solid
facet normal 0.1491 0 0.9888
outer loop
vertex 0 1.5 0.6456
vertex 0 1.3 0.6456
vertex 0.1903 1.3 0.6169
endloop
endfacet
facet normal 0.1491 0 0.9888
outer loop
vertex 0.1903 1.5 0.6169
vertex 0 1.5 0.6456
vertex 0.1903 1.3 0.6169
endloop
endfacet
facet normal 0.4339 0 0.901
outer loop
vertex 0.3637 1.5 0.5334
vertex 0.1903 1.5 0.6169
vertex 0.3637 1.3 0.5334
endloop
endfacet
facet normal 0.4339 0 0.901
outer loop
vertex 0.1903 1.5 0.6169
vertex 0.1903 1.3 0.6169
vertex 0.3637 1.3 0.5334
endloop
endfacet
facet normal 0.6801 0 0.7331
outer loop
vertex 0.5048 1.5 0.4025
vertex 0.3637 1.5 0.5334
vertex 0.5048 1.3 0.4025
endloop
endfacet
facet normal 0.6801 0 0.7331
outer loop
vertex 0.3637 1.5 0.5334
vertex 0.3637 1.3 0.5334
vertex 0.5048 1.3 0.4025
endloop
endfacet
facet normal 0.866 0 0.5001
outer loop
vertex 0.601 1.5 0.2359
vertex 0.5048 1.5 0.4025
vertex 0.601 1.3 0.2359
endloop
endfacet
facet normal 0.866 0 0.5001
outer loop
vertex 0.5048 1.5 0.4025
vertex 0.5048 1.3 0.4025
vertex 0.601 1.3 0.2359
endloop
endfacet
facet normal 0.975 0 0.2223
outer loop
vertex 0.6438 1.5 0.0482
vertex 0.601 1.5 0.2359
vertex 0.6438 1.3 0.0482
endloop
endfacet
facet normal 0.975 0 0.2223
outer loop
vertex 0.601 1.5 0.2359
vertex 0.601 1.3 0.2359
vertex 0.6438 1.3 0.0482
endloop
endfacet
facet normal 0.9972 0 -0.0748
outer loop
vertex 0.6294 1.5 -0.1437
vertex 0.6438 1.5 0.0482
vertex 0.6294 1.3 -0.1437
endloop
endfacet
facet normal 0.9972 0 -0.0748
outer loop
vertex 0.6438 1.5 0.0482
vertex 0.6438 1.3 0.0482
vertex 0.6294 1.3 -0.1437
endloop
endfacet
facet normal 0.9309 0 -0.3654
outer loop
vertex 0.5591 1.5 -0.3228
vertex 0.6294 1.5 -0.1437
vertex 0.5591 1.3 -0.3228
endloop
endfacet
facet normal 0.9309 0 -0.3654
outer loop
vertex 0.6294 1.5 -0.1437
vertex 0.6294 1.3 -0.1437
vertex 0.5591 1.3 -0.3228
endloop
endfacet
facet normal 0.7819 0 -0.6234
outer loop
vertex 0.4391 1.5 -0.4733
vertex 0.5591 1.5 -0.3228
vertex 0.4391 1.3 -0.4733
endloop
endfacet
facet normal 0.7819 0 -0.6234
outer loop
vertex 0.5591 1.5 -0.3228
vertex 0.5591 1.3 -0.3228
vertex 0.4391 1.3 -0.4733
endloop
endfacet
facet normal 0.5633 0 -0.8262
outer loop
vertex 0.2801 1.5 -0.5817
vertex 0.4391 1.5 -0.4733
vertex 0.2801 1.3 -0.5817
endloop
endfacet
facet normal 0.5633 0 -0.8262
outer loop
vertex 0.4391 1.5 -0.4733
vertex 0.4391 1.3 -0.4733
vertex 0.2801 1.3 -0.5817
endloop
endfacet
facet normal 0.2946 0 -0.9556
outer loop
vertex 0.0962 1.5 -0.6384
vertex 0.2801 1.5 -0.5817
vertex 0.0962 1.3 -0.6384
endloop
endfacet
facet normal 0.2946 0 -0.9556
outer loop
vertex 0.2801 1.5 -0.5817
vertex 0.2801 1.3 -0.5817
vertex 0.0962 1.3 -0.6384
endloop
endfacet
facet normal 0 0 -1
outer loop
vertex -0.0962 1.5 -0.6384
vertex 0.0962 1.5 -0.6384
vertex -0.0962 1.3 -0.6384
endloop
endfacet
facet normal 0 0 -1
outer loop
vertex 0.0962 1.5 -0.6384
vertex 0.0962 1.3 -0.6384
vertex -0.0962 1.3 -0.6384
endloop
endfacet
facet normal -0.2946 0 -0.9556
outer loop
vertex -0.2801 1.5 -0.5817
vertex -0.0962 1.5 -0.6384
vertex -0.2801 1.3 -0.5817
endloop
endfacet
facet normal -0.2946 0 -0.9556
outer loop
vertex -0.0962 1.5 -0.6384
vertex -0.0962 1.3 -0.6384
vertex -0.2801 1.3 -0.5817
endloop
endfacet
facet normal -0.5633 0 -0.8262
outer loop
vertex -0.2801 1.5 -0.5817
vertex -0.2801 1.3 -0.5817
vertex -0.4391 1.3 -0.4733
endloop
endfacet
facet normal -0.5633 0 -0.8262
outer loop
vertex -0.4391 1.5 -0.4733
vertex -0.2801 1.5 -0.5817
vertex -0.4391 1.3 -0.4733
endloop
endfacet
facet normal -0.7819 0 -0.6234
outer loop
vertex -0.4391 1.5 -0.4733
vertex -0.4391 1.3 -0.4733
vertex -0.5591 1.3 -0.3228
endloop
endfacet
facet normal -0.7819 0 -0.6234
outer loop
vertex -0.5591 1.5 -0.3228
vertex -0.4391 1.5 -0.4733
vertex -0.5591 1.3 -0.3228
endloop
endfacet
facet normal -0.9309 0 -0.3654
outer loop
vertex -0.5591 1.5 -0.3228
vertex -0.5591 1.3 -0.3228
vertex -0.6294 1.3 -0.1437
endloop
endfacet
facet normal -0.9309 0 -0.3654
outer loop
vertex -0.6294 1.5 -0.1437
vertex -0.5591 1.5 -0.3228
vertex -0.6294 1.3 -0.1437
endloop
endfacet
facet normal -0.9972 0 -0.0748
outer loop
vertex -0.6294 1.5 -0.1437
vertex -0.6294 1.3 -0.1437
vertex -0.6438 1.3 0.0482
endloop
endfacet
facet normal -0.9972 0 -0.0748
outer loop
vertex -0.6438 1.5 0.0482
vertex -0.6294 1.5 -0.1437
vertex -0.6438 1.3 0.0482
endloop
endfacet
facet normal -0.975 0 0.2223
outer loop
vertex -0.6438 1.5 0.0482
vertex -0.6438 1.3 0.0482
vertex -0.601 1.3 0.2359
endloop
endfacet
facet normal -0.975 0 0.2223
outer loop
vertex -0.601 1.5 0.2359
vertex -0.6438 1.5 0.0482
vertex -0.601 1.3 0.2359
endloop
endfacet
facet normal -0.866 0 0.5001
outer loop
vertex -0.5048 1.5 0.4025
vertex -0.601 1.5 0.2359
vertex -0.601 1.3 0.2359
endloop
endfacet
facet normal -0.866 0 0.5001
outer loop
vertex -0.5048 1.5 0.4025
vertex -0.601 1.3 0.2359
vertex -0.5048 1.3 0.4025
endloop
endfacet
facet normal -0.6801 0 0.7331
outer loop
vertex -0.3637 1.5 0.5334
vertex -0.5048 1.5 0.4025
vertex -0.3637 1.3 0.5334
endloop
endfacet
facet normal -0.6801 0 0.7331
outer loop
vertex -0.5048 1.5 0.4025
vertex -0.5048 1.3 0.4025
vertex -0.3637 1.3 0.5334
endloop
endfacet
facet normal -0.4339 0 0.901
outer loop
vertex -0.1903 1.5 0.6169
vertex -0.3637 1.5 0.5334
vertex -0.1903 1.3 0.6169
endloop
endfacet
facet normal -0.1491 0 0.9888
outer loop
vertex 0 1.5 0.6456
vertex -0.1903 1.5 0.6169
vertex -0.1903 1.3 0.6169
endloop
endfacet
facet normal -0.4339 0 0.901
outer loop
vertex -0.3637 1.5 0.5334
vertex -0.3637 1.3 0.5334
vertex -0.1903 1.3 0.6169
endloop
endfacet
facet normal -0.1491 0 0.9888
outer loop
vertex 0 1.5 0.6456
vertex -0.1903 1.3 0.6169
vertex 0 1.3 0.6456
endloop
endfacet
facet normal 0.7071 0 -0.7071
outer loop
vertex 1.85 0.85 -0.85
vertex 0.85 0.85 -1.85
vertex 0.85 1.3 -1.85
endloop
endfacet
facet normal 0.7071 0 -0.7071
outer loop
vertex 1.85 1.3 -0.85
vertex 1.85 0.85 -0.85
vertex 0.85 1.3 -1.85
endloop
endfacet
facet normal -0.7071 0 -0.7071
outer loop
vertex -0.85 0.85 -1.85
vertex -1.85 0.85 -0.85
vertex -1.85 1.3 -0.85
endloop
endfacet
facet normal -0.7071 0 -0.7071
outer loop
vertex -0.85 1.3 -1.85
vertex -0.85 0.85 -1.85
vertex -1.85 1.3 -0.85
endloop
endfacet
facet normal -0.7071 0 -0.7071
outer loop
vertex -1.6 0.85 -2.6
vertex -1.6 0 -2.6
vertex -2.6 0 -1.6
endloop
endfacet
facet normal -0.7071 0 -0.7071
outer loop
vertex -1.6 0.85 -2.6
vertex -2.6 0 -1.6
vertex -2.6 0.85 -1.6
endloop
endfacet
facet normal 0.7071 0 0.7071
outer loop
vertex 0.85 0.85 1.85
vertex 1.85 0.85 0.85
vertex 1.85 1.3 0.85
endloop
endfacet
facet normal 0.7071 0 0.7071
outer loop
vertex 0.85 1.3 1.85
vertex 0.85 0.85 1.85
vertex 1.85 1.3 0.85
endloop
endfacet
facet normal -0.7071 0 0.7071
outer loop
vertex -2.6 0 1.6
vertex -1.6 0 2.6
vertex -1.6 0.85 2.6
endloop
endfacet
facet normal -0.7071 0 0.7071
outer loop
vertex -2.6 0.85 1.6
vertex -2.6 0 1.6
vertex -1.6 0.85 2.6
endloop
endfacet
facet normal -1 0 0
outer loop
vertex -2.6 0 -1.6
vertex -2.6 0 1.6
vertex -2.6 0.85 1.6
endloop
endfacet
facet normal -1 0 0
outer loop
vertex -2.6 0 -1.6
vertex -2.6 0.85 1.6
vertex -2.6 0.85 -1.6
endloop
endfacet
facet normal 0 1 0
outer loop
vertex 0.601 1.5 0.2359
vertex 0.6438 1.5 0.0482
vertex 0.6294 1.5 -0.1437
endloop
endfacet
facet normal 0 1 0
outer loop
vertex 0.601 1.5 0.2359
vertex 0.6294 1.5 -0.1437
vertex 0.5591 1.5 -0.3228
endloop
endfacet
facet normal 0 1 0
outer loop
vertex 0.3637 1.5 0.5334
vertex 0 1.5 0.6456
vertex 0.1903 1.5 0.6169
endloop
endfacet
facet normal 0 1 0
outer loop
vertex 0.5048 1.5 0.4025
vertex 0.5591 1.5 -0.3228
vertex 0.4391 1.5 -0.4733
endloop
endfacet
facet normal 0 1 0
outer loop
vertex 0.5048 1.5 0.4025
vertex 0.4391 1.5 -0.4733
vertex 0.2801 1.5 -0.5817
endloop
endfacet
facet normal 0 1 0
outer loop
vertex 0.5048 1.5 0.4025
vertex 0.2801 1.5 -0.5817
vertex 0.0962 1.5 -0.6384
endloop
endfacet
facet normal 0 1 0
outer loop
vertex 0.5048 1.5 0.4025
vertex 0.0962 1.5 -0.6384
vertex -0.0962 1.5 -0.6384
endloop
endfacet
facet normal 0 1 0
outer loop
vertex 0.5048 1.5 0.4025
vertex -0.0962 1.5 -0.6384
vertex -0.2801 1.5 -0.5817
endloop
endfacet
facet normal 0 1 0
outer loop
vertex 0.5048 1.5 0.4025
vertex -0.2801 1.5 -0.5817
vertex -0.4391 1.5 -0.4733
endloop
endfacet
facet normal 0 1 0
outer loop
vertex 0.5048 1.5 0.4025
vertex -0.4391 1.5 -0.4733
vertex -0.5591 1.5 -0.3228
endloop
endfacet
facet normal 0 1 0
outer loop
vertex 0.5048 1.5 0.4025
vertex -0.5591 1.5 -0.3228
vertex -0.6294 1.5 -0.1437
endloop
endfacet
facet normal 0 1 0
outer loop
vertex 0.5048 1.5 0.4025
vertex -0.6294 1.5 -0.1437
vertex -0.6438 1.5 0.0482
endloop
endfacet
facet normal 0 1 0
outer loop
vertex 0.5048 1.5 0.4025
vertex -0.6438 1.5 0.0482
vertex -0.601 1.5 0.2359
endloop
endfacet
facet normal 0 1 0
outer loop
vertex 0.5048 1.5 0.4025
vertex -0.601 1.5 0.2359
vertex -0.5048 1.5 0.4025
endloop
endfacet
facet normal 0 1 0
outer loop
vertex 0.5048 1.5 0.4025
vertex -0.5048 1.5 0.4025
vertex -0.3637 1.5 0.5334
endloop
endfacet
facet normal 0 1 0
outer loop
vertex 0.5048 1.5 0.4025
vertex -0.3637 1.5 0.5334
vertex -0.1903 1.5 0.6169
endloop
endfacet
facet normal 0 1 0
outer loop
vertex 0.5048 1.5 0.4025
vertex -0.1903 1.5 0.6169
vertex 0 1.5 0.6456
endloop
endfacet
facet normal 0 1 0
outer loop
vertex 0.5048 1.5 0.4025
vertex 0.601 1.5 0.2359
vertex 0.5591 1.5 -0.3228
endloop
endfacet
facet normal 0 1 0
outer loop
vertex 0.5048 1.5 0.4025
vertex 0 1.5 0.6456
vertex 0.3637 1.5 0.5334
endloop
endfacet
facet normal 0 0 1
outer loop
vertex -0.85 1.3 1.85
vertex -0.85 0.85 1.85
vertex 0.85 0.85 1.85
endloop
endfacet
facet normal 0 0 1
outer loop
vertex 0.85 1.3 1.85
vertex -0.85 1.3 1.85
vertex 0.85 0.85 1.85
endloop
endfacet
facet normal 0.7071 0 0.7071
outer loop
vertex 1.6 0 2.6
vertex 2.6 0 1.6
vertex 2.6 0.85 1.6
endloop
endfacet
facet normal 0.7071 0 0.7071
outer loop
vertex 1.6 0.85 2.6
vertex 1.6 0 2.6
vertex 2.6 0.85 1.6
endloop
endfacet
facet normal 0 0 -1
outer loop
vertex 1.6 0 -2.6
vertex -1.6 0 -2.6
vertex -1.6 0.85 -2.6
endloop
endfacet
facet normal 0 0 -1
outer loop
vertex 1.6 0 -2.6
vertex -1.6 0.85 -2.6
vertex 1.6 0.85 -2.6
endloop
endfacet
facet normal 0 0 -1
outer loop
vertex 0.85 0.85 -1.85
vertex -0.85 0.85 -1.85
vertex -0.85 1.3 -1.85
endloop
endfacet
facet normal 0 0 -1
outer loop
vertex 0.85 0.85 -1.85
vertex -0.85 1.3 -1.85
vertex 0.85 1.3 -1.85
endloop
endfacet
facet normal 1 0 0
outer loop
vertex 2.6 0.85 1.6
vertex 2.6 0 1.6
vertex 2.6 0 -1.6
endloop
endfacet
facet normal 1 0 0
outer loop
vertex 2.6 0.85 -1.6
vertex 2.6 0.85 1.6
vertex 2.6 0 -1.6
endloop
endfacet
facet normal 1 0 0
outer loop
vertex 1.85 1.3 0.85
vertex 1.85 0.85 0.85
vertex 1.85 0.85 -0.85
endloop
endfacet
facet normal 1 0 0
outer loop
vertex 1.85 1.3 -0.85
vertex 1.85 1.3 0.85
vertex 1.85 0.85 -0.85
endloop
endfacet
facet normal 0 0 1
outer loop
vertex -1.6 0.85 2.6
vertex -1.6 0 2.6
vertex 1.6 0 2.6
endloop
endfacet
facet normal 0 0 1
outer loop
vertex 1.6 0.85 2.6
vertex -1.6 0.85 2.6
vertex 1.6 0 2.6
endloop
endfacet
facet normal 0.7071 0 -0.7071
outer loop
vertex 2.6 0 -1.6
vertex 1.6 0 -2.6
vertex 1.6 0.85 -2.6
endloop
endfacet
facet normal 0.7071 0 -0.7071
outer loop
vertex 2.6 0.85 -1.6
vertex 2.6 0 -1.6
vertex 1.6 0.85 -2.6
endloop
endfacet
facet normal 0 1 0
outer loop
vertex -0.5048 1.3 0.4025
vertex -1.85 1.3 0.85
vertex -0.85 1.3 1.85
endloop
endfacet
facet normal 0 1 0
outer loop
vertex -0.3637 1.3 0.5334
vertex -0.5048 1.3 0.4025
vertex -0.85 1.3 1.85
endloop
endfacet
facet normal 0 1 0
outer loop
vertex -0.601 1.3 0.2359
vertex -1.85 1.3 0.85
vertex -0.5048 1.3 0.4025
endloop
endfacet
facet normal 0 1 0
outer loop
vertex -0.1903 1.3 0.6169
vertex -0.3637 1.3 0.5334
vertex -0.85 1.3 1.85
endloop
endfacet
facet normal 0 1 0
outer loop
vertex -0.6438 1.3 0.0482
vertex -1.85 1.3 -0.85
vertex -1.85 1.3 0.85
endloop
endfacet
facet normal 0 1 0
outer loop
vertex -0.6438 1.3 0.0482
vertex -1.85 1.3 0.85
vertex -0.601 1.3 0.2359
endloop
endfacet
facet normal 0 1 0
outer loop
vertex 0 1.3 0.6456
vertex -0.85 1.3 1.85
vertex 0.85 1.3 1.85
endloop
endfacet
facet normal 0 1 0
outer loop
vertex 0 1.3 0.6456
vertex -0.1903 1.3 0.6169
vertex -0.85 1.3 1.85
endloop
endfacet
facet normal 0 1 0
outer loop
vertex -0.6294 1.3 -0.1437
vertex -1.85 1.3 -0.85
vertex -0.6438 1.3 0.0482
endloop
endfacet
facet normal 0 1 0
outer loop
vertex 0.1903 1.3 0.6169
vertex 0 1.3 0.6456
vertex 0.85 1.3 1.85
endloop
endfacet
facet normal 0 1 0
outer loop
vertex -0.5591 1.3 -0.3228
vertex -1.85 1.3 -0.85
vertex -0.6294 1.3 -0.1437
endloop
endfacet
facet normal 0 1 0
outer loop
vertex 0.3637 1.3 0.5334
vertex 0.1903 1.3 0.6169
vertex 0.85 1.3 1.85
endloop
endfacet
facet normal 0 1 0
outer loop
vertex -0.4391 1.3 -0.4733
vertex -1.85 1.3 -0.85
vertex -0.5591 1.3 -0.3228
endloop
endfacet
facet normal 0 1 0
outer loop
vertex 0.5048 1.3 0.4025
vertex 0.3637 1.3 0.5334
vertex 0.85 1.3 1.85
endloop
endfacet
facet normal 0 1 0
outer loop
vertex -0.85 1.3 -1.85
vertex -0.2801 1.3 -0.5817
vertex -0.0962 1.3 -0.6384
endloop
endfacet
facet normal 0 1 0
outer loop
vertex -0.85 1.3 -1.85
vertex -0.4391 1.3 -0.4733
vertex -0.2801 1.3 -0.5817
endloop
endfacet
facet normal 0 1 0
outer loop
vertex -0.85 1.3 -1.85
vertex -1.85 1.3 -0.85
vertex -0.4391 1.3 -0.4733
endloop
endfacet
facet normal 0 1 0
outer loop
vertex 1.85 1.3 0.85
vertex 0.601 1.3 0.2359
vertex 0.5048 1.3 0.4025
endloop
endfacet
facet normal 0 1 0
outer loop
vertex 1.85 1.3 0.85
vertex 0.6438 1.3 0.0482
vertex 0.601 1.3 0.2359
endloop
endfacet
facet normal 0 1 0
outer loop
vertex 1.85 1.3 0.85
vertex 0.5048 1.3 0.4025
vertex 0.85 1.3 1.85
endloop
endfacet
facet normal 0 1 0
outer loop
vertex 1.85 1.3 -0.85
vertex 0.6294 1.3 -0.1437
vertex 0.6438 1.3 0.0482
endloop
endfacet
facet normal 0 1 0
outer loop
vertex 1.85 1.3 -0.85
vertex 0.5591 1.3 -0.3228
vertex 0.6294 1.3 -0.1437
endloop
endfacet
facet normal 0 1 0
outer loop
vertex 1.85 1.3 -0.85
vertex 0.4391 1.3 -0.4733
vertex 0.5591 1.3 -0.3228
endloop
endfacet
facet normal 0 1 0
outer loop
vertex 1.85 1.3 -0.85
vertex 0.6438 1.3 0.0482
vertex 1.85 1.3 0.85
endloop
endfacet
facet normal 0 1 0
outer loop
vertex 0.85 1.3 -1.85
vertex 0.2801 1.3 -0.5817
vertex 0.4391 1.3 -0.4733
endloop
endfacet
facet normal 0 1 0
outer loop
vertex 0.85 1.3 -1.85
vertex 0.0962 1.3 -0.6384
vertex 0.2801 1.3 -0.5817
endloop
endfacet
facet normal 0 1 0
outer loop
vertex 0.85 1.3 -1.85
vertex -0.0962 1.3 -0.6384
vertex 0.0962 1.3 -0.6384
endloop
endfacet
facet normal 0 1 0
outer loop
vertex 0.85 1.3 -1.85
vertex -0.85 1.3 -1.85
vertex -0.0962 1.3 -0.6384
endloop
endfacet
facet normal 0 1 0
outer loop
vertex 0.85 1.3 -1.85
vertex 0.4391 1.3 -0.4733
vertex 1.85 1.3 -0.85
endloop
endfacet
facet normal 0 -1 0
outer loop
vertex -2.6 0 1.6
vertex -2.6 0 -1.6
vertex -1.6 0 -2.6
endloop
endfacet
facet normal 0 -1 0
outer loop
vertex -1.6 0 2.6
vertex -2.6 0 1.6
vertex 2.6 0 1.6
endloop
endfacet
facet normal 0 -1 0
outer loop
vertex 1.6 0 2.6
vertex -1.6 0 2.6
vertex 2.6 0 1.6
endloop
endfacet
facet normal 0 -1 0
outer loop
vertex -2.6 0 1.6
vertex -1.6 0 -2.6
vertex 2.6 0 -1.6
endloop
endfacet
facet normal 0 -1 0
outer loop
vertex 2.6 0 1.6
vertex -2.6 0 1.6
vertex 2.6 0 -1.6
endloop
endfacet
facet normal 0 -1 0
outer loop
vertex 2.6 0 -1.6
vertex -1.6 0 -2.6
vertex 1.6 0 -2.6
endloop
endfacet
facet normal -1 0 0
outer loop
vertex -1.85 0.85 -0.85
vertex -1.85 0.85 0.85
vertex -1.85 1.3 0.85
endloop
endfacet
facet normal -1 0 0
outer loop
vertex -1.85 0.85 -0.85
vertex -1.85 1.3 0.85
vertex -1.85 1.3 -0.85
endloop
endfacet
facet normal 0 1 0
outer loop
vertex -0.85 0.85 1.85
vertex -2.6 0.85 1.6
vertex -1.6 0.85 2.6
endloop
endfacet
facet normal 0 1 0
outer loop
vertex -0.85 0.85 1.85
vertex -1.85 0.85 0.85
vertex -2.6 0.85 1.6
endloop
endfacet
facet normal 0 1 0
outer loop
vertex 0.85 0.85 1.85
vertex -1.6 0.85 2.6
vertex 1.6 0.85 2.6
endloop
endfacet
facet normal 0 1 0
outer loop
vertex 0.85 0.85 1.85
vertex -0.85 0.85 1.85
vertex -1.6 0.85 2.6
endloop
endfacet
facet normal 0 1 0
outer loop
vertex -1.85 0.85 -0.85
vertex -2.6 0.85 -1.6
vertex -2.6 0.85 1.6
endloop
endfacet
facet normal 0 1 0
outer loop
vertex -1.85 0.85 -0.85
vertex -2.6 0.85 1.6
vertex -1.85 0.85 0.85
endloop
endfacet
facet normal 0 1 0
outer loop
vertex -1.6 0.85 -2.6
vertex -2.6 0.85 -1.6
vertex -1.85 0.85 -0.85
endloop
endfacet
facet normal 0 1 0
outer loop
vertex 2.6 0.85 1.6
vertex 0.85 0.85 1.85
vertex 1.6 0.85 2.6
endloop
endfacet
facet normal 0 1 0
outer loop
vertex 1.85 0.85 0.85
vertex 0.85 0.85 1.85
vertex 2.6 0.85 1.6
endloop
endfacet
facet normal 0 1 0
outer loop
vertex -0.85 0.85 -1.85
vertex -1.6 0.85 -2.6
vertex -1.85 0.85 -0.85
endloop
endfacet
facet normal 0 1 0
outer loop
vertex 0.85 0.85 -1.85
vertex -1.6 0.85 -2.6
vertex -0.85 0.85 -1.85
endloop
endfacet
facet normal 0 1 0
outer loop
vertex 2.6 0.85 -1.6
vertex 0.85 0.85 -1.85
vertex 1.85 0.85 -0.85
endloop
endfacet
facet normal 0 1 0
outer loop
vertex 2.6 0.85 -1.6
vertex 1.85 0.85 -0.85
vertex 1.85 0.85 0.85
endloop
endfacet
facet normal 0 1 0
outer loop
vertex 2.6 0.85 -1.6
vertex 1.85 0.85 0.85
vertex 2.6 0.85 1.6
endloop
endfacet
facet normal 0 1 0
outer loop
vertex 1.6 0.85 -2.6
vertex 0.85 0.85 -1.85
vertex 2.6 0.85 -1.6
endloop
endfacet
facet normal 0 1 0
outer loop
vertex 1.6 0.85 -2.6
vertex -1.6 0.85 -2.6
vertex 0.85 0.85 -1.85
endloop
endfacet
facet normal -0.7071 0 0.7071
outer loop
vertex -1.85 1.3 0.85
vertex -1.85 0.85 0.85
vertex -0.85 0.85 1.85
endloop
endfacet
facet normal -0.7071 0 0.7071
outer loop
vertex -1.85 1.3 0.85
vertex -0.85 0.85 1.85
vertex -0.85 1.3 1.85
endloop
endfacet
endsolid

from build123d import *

# Parameters (mm, degrees)
SKETCH_1_W      = 5.2
SKETCH_1_H      = 5.2
EXTRUDE_1_DEPTH = 0.85
CHAMFER_1_SIZE  = 1
SKETCH_2_W      = 3.7
SKETCH_2_H      = 3.7
EXTRUDE_2_DEPTH = 0.45
CHAMFER_2_SIZE  = 1
SKETCH_3_R      = 0.645603451
EXTRUDE_3_DEPTH = 0.2


with BuildPart() as part:
    # 草图1 → 凸台-拉伸1 (new body)
    with BuildSketch(Plane(origin=(0, 0, 0), x_dir=(1, 0, 0), z_dir=(0, 1, 0))):
        Rectangle(SKETCH_1_W, SKETCH_1_H)
    extrude(amount=EXTRUDE_1_DEPTH)

    # 倒角1
    chamfer_1_edges = [part.edges().sort_by_distance(p)[0] for p in [
        (2.6, 0.425, 2.6),
        (-2.6, 0.425, 2.6),
        (-2.6, 0.425, -2.6),
        (2.6, 0.425, -2.6),
    ]]
    chamfer(chamfer_1_edges, length=CHAMFER_1_SIZE)

    # 草图2 → 凸台-拉伸2 (add)
    with BuildSketch(Plane(origin=(0, 0.85, 0), x_dir=(1, 0, 0), z_dir=(0, 1, 0))):
        Rectangle(SKETCH_2_W, SKETCH_2_H)
    extrude(amount=EXTRUDE_2_DEPTH)

    # 倒角2
    chamfer_2_edges = [part.edges().sort_by_distance(p)[0] for p in [
        (1.85, 1.075, 1.85),
        (1.85, 1.075, -1.85),
        (-1.85, 1.075, -1.85),
        (-1.85, 1.075, 1.85),
    ]]
    chamfer(chamfer_2_edges, length=CHAMFER_2_SIZE)

    # 草图3 → 凸台-拉伸3 (add)
    with BuildSketch(Plane(origin=(0, 1.3, 0), x_dir=(1, 0, 0), z_dir=(0, 1, 0))):
        with Locations(Location((0, 0, 0), (0, 0, 270))):
            Circle(SKETCH_3_R)
    extrude(amount=EXTRUDE_3_DEPTH)


solid = part.part
